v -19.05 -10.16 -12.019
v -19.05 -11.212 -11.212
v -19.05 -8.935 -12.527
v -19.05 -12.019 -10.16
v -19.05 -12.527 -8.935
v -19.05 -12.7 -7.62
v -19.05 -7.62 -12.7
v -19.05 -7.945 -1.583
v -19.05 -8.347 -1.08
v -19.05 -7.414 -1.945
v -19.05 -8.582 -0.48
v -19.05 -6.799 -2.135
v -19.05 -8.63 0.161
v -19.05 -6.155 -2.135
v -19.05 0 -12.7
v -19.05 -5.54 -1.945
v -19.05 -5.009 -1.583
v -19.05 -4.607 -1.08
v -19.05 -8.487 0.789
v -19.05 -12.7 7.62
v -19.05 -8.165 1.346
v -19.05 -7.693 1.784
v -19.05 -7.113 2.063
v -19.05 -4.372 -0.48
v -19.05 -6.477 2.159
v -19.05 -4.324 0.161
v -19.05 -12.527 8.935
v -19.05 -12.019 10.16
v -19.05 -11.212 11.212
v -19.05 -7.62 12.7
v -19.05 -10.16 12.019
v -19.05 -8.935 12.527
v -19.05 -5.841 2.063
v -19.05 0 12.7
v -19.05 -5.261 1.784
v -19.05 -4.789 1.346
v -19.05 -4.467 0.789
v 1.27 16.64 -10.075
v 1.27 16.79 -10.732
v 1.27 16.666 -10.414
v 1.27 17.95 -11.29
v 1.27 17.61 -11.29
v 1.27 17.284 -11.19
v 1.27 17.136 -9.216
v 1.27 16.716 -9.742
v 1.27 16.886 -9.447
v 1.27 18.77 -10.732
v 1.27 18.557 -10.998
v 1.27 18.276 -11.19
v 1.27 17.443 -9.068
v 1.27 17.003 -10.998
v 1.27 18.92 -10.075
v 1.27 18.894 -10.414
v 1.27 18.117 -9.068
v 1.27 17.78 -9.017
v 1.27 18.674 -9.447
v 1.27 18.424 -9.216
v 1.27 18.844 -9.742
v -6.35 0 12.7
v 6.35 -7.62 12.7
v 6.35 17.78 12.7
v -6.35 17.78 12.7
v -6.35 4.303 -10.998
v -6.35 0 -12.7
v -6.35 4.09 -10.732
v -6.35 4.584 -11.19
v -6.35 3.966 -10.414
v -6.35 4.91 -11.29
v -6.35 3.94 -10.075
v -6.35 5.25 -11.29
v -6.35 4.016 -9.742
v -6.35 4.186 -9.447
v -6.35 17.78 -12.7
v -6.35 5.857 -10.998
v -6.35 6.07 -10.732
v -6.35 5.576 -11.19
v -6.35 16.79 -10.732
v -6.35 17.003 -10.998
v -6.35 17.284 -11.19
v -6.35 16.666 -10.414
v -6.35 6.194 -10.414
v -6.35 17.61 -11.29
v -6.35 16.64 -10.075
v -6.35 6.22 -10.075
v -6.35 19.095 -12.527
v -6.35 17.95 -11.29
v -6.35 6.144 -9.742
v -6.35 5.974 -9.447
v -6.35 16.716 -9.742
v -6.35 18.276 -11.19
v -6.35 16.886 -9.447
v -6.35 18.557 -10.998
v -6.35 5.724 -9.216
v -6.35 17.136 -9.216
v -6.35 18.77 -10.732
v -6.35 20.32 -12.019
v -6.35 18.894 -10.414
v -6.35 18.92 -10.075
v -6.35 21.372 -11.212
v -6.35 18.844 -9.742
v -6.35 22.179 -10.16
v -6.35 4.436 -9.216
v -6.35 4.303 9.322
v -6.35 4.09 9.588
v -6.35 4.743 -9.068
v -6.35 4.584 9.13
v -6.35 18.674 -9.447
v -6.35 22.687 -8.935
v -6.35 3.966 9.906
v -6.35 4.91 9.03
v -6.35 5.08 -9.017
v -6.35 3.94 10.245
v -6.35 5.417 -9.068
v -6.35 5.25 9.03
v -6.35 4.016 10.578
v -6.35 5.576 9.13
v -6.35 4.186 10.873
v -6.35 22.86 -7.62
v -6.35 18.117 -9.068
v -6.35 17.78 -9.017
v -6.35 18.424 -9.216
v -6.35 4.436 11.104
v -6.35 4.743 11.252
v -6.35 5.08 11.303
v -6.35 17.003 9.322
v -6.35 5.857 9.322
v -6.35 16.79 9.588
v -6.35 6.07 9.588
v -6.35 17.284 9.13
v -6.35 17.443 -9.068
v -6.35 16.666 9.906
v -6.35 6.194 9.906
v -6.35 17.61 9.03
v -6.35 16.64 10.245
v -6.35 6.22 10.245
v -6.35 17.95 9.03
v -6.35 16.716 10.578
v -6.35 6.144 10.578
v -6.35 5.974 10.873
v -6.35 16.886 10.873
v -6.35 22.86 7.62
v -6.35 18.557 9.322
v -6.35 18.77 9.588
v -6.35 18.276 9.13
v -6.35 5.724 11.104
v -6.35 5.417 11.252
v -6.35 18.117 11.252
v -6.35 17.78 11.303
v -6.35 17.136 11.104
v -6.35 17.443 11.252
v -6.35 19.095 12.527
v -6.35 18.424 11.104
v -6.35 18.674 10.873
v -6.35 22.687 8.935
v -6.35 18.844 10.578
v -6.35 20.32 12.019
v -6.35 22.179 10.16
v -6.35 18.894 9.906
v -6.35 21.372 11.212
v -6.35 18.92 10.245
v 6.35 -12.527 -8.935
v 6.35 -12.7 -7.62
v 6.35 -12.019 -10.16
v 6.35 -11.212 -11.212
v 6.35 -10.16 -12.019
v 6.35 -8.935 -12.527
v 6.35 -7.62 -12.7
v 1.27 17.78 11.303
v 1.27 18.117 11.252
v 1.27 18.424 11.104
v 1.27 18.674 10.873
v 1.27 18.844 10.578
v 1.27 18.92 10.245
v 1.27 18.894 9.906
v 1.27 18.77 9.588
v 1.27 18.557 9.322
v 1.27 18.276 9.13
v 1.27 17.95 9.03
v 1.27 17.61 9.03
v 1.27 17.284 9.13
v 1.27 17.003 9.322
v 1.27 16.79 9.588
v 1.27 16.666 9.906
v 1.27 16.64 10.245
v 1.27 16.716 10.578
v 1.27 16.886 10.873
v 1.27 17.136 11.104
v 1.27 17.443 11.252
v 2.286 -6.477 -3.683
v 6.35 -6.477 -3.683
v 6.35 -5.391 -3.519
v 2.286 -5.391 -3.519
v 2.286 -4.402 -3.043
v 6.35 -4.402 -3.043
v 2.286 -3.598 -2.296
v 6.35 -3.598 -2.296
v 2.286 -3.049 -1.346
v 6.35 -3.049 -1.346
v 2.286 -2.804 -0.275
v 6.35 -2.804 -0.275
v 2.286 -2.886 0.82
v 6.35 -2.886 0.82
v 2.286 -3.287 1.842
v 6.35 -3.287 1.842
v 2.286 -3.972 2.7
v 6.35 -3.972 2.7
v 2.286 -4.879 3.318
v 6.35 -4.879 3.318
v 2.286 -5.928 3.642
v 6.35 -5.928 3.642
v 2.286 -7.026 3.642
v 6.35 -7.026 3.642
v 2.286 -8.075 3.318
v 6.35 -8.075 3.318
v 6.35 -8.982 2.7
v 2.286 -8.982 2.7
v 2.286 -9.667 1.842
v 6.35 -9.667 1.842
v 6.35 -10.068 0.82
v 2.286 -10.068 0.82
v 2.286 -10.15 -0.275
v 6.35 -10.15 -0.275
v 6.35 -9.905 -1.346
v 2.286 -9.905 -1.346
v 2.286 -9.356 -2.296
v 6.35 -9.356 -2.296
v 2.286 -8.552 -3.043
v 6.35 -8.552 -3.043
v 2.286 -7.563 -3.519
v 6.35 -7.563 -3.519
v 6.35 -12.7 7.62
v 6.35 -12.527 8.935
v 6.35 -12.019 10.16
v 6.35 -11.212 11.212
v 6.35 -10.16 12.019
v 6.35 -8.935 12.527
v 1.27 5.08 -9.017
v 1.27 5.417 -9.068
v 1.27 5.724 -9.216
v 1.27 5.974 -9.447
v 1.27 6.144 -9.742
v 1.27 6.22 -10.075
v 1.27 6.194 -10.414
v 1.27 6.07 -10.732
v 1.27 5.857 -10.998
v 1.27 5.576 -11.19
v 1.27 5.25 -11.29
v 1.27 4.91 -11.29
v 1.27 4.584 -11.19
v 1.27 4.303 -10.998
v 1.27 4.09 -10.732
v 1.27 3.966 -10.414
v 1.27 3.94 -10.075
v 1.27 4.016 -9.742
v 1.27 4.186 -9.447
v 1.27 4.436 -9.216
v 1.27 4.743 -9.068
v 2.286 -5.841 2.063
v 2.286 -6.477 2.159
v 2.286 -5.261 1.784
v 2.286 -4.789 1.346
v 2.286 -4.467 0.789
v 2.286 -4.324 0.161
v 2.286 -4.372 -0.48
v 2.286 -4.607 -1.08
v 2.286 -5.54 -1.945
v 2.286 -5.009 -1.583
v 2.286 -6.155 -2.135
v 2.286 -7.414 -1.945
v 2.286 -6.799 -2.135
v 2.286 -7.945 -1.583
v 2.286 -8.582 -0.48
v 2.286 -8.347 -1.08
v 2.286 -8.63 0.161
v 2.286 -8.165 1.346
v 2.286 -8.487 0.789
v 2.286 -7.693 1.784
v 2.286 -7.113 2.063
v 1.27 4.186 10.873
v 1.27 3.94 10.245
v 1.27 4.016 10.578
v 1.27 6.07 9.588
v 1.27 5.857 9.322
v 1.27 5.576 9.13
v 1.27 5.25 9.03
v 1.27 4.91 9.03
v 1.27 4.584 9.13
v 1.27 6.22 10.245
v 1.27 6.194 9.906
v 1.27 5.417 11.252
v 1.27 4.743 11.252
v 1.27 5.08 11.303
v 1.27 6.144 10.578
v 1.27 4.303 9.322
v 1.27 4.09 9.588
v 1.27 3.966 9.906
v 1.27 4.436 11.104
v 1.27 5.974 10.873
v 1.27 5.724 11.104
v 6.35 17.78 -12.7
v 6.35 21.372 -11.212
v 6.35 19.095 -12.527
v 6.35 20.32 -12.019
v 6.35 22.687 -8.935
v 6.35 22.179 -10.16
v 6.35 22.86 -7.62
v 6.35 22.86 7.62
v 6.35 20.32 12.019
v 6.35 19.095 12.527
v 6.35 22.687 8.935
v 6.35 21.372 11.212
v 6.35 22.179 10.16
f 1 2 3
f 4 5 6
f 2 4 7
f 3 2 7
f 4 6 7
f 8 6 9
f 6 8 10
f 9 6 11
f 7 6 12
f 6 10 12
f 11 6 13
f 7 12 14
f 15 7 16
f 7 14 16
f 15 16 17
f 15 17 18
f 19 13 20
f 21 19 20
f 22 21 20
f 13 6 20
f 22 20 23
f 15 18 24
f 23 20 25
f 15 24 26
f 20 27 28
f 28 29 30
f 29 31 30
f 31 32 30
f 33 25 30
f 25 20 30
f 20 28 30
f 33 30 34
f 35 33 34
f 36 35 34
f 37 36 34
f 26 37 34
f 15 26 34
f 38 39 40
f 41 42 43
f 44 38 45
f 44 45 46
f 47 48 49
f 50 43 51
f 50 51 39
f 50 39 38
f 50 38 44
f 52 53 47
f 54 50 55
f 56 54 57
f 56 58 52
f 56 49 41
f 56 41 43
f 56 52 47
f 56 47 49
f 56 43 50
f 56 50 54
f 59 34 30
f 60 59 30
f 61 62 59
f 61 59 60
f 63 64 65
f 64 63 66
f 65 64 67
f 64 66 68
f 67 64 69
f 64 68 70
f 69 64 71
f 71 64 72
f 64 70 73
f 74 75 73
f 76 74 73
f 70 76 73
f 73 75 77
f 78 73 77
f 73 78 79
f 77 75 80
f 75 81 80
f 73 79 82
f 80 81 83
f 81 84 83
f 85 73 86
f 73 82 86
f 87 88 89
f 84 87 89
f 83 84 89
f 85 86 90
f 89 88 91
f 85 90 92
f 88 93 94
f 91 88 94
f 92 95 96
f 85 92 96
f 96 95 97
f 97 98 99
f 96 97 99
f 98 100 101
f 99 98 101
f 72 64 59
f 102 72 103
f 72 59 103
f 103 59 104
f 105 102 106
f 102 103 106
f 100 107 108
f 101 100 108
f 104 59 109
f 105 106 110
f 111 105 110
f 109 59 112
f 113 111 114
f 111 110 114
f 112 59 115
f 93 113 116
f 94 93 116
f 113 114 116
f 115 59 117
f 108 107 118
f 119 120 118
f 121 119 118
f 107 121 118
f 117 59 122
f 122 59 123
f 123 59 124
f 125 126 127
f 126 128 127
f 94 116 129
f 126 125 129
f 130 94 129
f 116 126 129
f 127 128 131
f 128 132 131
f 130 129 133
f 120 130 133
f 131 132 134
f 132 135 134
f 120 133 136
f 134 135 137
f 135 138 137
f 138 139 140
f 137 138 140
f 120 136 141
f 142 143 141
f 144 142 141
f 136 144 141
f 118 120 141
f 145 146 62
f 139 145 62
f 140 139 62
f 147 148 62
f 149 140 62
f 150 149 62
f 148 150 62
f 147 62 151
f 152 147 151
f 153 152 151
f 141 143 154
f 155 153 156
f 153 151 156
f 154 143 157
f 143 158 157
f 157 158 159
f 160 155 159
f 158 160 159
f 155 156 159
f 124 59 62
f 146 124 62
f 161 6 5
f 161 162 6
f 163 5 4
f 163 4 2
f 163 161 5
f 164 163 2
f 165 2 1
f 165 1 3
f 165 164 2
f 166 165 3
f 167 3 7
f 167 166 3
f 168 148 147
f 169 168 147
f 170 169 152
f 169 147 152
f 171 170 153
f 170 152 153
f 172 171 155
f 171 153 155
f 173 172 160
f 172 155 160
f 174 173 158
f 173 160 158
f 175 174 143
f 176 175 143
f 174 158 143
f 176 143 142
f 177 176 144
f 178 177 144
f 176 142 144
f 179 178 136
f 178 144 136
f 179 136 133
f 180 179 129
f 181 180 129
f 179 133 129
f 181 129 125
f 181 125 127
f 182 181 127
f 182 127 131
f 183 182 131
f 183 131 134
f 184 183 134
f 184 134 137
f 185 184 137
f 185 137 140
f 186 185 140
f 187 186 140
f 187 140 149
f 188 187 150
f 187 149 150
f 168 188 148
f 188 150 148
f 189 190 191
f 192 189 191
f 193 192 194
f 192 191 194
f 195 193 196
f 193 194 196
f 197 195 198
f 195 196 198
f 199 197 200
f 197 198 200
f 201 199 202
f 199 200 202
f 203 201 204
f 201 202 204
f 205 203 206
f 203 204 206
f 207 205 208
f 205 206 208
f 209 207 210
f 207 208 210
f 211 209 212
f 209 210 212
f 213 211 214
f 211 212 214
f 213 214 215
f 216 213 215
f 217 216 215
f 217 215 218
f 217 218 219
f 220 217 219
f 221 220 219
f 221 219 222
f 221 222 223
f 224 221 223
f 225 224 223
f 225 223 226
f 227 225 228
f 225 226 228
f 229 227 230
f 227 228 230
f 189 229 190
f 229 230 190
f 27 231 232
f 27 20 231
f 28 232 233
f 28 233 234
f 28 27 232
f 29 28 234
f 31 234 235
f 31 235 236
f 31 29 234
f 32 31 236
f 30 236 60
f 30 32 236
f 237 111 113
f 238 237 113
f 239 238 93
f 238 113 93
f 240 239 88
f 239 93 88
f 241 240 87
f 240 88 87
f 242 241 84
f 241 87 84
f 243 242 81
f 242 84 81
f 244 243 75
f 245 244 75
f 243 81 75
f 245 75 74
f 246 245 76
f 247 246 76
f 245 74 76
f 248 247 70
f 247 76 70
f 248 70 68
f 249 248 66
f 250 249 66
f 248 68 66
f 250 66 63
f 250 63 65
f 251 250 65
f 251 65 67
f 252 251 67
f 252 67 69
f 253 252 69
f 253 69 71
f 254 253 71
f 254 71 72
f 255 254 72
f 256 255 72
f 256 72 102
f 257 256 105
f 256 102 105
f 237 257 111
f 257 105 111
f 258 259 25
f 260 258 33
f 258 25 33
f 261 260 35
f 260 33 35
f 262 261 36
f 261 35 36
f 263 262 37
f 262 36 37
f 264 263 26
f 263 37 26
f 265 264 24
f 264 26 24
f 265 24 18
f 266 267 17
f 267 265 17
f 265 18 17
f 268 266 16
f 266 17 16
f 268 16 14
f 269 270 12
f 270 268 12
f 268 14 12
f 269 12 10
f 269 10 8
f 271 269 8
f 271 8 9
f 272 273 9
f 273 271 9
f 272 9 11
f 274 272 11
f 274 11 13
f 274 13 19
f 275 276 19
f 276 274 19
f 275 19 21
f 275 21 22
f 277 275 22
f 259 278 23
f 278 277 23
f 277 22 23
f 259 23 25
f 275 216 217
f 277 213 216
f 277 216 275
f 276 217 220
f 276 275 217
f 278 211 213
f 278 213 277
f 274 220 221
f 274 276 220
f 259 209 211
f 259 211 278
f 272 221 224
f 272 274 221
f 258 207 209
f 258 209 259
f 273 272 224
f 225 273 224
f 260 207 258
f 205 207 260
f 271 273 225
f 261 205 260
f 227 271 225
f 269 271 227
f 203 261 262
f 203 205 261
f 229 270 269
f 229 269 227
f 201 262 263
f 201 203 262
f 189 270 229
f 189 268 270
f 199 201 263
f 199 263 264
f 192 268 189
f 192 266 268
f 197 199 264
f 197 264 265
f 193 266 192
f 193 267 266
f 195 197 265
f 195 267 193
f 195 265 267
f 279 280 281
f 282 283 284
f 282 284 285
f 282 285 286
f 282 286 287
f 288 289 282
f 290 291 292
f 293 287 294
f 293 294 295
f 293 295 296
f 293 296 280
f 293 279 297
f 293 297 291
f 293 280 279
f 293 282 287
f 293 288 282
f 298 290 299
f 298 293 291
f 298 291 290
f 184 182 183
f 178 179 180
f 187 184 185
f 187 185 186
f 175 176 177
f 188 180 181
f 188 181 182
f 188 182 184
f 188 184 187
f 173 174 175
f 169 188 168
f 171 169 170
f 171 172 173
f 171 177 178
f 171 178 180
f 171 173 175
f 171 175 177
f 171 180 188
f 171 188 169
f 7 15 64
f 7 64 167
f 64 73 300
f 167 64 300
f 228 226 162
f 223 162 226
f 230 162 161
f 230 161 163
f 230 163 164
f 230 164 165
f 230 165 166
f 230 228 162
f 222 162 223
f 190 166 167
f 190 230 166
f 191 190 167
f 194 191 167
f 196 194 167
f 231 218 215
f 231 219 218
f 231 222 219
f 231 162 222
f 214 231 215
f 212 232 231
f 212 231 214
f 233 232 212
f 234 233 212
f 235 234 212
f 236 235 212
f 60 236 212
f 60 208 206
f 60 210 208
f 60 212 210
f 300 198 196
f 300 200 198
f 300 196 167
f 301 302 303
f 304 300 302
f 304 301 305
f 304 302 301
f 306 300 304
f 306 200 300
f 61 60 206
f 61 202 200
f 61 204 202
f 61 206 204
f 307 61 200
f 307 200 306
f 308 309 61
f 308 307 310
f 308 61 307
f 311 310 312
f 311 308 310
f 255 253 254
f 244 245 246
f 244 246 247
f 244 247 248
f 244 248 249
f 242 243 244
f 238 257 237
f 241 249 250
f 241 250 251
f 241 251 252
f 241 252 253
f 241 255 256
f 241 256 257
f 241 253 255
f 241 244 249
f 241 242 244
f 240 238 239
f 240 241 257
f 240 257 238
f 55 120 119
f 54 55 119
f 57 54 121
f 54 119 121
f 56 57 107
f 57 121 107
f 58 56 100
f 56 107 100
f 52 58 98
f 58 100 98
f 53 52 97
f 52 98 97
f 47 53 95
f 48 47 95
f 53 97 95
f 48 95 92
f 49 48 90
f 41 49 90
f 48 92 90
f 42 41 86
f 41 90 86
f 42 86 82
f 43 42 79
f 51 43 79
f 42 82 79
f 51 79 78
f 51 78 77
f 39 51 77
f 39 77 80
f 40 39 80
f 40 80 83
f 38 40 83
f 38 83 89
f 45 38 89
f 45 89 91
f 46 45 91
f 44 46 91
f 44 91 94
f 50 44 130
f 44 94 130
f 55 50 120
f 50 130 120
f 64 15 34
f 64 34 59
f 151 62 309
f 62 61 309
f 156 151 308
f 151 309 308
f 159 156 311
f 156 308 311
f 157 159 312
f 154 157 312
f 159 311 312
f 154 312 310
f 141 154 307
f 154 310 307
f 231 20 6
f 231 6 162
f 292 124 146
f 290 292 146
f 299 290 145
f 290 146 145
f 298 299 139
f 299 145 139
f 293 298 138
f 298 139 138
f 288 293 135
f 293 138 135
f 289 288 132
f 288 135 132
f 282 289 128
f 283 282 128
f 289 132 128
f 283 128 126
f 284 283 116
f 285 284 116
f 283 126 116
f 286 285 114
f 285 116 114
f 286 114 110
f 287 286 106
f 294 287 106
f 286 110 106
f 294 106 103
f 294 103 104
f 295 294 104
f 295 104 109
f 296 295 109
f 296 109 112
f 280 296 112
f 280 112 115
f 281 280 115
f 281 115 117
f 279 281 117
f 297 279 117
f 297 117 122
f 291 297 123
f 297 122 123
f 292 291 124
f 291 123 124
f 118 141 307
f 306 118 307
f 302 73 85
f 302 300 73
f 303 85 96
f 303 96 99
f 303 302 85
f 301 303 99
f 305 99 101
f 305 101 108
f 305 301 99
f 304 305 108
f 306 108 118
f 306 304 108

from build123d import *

# Parameters (mm, degrees)
PROFILE_W               = 12.7
PROFILE_H               = 22.86
PROFILE_W_2             = 6.35
PROFILE_H_2             = 12.7
BOSS_EXTRUDE1_DEPTH     = 12.7
SKETCH7_W               = 19.05
SKETCH7_H               = 12.7
BOSS_EXTRUDE2_DEPTH     = 25.4
SCREWHOLE_R             = 2.159
CUT_EXTRUDE1_DEPTH      = 1
CUT_EXTRUDE1_DEPTH_BACK = 26.4
SKETCH3_R               = 3.683
SKETCH3_R_2             = 2.159
CUT_EXTRUDE2_DEPTH      = 4.064
SKETCH10_R              = 1.143
CUT_EXTRUDE3_DEPTH      = 7.62
FILLET6_R               = 5.08


with BuildPart() as part:
    # Profile → Boss-Extrude1 (new body, symmetric)
    with BuildSketch(Plane.XY):
        with Locations((0, 11.43)):
            Rectangle(PROFILE_W, PROFILE_H)
        with Locations((3.175, -6.35)):
            Rectangle(PROFILE_W_2, PROFILE_H_2)
    extrude(amount=BOSS_EXTRUDE1_DEPTH, both=True)

    # Sketch7 → Boss-Extrude2 (add)
    with BuildSketch(Plane.XY.offset(12.7)):
        with Locations((-9.525, -6.35)):
            Rectangle(SKETCH7_W, SKETCH7_H)
    extrude(amount=-BOSS_EXTRUDE2_DEPTH)

    # ScrewHole → Cut-Extrude1 (cut, two sides)
    with BuildSketch(Plane.ZY.offset(19.05)) as cut_extrude1_sk:
        with Locations((0, -6.477)):
            Circle(SCREWHOLE_R)
    extrude(amount=CUT_EXTRUDE1_DEPTH, mode=Mode.SUBTRACT)
    extrude(cut_extrude1_sk.sketch, amount=-CUT_EXTRUDE1_DEPTH_BACK, mode=Mode.SUBTRACT)

    # Sketch3 → Cut-Extrude2 (cut)
    with BuildSketch(Plane(origin=(6.35, 0, 0), x_dir=(0, 0, -1), z_dir=(1, 0, 0))):
        with Locations((0, -6.477)):
            Circle(SKETCH3_R)
        with Locations((0, -6.477)):
            Circle(SKETCH3_R_2, mode=Mode.SUBTRACT)
    extrude(amount=-CUT_EXTRUDE2_DEPTH, mode=Mode.SUBTRACT)

    # Sketch10 → Cut-Extrude3 (cut)
    with BuildSketch(Plane.ZY.offset(6.35)):
        with Locations((-10.16, 17.78)):
            Circle(SKETCH10_R)
        with Locations((10.16, 17.78)):
            Circle(SKETCH10_R)
        with Locations((10.16, 5.08)):
            Circle(SKETCH10_R)
        with Locations((-10.16, 5.08)):
            Circle(SKETCH10_R)
    extrude(amount=-CUT_EXTRUDE3_DEPTH, mode=Mode.SUBTRACT)

    # Fillet6
    fillet6_edges = [part.edges().sort_by_distance(p)[0] for p in [
        (0, 22.86, -12.7),
        (0, 22.86, 12.7),
        (-6.35, -12.7, 12.7),
        (-6.35, -12.7, -12.7),
    ]]
    fillet(fillet6_edges, radius=FILLET6_R)


solid = part.part
